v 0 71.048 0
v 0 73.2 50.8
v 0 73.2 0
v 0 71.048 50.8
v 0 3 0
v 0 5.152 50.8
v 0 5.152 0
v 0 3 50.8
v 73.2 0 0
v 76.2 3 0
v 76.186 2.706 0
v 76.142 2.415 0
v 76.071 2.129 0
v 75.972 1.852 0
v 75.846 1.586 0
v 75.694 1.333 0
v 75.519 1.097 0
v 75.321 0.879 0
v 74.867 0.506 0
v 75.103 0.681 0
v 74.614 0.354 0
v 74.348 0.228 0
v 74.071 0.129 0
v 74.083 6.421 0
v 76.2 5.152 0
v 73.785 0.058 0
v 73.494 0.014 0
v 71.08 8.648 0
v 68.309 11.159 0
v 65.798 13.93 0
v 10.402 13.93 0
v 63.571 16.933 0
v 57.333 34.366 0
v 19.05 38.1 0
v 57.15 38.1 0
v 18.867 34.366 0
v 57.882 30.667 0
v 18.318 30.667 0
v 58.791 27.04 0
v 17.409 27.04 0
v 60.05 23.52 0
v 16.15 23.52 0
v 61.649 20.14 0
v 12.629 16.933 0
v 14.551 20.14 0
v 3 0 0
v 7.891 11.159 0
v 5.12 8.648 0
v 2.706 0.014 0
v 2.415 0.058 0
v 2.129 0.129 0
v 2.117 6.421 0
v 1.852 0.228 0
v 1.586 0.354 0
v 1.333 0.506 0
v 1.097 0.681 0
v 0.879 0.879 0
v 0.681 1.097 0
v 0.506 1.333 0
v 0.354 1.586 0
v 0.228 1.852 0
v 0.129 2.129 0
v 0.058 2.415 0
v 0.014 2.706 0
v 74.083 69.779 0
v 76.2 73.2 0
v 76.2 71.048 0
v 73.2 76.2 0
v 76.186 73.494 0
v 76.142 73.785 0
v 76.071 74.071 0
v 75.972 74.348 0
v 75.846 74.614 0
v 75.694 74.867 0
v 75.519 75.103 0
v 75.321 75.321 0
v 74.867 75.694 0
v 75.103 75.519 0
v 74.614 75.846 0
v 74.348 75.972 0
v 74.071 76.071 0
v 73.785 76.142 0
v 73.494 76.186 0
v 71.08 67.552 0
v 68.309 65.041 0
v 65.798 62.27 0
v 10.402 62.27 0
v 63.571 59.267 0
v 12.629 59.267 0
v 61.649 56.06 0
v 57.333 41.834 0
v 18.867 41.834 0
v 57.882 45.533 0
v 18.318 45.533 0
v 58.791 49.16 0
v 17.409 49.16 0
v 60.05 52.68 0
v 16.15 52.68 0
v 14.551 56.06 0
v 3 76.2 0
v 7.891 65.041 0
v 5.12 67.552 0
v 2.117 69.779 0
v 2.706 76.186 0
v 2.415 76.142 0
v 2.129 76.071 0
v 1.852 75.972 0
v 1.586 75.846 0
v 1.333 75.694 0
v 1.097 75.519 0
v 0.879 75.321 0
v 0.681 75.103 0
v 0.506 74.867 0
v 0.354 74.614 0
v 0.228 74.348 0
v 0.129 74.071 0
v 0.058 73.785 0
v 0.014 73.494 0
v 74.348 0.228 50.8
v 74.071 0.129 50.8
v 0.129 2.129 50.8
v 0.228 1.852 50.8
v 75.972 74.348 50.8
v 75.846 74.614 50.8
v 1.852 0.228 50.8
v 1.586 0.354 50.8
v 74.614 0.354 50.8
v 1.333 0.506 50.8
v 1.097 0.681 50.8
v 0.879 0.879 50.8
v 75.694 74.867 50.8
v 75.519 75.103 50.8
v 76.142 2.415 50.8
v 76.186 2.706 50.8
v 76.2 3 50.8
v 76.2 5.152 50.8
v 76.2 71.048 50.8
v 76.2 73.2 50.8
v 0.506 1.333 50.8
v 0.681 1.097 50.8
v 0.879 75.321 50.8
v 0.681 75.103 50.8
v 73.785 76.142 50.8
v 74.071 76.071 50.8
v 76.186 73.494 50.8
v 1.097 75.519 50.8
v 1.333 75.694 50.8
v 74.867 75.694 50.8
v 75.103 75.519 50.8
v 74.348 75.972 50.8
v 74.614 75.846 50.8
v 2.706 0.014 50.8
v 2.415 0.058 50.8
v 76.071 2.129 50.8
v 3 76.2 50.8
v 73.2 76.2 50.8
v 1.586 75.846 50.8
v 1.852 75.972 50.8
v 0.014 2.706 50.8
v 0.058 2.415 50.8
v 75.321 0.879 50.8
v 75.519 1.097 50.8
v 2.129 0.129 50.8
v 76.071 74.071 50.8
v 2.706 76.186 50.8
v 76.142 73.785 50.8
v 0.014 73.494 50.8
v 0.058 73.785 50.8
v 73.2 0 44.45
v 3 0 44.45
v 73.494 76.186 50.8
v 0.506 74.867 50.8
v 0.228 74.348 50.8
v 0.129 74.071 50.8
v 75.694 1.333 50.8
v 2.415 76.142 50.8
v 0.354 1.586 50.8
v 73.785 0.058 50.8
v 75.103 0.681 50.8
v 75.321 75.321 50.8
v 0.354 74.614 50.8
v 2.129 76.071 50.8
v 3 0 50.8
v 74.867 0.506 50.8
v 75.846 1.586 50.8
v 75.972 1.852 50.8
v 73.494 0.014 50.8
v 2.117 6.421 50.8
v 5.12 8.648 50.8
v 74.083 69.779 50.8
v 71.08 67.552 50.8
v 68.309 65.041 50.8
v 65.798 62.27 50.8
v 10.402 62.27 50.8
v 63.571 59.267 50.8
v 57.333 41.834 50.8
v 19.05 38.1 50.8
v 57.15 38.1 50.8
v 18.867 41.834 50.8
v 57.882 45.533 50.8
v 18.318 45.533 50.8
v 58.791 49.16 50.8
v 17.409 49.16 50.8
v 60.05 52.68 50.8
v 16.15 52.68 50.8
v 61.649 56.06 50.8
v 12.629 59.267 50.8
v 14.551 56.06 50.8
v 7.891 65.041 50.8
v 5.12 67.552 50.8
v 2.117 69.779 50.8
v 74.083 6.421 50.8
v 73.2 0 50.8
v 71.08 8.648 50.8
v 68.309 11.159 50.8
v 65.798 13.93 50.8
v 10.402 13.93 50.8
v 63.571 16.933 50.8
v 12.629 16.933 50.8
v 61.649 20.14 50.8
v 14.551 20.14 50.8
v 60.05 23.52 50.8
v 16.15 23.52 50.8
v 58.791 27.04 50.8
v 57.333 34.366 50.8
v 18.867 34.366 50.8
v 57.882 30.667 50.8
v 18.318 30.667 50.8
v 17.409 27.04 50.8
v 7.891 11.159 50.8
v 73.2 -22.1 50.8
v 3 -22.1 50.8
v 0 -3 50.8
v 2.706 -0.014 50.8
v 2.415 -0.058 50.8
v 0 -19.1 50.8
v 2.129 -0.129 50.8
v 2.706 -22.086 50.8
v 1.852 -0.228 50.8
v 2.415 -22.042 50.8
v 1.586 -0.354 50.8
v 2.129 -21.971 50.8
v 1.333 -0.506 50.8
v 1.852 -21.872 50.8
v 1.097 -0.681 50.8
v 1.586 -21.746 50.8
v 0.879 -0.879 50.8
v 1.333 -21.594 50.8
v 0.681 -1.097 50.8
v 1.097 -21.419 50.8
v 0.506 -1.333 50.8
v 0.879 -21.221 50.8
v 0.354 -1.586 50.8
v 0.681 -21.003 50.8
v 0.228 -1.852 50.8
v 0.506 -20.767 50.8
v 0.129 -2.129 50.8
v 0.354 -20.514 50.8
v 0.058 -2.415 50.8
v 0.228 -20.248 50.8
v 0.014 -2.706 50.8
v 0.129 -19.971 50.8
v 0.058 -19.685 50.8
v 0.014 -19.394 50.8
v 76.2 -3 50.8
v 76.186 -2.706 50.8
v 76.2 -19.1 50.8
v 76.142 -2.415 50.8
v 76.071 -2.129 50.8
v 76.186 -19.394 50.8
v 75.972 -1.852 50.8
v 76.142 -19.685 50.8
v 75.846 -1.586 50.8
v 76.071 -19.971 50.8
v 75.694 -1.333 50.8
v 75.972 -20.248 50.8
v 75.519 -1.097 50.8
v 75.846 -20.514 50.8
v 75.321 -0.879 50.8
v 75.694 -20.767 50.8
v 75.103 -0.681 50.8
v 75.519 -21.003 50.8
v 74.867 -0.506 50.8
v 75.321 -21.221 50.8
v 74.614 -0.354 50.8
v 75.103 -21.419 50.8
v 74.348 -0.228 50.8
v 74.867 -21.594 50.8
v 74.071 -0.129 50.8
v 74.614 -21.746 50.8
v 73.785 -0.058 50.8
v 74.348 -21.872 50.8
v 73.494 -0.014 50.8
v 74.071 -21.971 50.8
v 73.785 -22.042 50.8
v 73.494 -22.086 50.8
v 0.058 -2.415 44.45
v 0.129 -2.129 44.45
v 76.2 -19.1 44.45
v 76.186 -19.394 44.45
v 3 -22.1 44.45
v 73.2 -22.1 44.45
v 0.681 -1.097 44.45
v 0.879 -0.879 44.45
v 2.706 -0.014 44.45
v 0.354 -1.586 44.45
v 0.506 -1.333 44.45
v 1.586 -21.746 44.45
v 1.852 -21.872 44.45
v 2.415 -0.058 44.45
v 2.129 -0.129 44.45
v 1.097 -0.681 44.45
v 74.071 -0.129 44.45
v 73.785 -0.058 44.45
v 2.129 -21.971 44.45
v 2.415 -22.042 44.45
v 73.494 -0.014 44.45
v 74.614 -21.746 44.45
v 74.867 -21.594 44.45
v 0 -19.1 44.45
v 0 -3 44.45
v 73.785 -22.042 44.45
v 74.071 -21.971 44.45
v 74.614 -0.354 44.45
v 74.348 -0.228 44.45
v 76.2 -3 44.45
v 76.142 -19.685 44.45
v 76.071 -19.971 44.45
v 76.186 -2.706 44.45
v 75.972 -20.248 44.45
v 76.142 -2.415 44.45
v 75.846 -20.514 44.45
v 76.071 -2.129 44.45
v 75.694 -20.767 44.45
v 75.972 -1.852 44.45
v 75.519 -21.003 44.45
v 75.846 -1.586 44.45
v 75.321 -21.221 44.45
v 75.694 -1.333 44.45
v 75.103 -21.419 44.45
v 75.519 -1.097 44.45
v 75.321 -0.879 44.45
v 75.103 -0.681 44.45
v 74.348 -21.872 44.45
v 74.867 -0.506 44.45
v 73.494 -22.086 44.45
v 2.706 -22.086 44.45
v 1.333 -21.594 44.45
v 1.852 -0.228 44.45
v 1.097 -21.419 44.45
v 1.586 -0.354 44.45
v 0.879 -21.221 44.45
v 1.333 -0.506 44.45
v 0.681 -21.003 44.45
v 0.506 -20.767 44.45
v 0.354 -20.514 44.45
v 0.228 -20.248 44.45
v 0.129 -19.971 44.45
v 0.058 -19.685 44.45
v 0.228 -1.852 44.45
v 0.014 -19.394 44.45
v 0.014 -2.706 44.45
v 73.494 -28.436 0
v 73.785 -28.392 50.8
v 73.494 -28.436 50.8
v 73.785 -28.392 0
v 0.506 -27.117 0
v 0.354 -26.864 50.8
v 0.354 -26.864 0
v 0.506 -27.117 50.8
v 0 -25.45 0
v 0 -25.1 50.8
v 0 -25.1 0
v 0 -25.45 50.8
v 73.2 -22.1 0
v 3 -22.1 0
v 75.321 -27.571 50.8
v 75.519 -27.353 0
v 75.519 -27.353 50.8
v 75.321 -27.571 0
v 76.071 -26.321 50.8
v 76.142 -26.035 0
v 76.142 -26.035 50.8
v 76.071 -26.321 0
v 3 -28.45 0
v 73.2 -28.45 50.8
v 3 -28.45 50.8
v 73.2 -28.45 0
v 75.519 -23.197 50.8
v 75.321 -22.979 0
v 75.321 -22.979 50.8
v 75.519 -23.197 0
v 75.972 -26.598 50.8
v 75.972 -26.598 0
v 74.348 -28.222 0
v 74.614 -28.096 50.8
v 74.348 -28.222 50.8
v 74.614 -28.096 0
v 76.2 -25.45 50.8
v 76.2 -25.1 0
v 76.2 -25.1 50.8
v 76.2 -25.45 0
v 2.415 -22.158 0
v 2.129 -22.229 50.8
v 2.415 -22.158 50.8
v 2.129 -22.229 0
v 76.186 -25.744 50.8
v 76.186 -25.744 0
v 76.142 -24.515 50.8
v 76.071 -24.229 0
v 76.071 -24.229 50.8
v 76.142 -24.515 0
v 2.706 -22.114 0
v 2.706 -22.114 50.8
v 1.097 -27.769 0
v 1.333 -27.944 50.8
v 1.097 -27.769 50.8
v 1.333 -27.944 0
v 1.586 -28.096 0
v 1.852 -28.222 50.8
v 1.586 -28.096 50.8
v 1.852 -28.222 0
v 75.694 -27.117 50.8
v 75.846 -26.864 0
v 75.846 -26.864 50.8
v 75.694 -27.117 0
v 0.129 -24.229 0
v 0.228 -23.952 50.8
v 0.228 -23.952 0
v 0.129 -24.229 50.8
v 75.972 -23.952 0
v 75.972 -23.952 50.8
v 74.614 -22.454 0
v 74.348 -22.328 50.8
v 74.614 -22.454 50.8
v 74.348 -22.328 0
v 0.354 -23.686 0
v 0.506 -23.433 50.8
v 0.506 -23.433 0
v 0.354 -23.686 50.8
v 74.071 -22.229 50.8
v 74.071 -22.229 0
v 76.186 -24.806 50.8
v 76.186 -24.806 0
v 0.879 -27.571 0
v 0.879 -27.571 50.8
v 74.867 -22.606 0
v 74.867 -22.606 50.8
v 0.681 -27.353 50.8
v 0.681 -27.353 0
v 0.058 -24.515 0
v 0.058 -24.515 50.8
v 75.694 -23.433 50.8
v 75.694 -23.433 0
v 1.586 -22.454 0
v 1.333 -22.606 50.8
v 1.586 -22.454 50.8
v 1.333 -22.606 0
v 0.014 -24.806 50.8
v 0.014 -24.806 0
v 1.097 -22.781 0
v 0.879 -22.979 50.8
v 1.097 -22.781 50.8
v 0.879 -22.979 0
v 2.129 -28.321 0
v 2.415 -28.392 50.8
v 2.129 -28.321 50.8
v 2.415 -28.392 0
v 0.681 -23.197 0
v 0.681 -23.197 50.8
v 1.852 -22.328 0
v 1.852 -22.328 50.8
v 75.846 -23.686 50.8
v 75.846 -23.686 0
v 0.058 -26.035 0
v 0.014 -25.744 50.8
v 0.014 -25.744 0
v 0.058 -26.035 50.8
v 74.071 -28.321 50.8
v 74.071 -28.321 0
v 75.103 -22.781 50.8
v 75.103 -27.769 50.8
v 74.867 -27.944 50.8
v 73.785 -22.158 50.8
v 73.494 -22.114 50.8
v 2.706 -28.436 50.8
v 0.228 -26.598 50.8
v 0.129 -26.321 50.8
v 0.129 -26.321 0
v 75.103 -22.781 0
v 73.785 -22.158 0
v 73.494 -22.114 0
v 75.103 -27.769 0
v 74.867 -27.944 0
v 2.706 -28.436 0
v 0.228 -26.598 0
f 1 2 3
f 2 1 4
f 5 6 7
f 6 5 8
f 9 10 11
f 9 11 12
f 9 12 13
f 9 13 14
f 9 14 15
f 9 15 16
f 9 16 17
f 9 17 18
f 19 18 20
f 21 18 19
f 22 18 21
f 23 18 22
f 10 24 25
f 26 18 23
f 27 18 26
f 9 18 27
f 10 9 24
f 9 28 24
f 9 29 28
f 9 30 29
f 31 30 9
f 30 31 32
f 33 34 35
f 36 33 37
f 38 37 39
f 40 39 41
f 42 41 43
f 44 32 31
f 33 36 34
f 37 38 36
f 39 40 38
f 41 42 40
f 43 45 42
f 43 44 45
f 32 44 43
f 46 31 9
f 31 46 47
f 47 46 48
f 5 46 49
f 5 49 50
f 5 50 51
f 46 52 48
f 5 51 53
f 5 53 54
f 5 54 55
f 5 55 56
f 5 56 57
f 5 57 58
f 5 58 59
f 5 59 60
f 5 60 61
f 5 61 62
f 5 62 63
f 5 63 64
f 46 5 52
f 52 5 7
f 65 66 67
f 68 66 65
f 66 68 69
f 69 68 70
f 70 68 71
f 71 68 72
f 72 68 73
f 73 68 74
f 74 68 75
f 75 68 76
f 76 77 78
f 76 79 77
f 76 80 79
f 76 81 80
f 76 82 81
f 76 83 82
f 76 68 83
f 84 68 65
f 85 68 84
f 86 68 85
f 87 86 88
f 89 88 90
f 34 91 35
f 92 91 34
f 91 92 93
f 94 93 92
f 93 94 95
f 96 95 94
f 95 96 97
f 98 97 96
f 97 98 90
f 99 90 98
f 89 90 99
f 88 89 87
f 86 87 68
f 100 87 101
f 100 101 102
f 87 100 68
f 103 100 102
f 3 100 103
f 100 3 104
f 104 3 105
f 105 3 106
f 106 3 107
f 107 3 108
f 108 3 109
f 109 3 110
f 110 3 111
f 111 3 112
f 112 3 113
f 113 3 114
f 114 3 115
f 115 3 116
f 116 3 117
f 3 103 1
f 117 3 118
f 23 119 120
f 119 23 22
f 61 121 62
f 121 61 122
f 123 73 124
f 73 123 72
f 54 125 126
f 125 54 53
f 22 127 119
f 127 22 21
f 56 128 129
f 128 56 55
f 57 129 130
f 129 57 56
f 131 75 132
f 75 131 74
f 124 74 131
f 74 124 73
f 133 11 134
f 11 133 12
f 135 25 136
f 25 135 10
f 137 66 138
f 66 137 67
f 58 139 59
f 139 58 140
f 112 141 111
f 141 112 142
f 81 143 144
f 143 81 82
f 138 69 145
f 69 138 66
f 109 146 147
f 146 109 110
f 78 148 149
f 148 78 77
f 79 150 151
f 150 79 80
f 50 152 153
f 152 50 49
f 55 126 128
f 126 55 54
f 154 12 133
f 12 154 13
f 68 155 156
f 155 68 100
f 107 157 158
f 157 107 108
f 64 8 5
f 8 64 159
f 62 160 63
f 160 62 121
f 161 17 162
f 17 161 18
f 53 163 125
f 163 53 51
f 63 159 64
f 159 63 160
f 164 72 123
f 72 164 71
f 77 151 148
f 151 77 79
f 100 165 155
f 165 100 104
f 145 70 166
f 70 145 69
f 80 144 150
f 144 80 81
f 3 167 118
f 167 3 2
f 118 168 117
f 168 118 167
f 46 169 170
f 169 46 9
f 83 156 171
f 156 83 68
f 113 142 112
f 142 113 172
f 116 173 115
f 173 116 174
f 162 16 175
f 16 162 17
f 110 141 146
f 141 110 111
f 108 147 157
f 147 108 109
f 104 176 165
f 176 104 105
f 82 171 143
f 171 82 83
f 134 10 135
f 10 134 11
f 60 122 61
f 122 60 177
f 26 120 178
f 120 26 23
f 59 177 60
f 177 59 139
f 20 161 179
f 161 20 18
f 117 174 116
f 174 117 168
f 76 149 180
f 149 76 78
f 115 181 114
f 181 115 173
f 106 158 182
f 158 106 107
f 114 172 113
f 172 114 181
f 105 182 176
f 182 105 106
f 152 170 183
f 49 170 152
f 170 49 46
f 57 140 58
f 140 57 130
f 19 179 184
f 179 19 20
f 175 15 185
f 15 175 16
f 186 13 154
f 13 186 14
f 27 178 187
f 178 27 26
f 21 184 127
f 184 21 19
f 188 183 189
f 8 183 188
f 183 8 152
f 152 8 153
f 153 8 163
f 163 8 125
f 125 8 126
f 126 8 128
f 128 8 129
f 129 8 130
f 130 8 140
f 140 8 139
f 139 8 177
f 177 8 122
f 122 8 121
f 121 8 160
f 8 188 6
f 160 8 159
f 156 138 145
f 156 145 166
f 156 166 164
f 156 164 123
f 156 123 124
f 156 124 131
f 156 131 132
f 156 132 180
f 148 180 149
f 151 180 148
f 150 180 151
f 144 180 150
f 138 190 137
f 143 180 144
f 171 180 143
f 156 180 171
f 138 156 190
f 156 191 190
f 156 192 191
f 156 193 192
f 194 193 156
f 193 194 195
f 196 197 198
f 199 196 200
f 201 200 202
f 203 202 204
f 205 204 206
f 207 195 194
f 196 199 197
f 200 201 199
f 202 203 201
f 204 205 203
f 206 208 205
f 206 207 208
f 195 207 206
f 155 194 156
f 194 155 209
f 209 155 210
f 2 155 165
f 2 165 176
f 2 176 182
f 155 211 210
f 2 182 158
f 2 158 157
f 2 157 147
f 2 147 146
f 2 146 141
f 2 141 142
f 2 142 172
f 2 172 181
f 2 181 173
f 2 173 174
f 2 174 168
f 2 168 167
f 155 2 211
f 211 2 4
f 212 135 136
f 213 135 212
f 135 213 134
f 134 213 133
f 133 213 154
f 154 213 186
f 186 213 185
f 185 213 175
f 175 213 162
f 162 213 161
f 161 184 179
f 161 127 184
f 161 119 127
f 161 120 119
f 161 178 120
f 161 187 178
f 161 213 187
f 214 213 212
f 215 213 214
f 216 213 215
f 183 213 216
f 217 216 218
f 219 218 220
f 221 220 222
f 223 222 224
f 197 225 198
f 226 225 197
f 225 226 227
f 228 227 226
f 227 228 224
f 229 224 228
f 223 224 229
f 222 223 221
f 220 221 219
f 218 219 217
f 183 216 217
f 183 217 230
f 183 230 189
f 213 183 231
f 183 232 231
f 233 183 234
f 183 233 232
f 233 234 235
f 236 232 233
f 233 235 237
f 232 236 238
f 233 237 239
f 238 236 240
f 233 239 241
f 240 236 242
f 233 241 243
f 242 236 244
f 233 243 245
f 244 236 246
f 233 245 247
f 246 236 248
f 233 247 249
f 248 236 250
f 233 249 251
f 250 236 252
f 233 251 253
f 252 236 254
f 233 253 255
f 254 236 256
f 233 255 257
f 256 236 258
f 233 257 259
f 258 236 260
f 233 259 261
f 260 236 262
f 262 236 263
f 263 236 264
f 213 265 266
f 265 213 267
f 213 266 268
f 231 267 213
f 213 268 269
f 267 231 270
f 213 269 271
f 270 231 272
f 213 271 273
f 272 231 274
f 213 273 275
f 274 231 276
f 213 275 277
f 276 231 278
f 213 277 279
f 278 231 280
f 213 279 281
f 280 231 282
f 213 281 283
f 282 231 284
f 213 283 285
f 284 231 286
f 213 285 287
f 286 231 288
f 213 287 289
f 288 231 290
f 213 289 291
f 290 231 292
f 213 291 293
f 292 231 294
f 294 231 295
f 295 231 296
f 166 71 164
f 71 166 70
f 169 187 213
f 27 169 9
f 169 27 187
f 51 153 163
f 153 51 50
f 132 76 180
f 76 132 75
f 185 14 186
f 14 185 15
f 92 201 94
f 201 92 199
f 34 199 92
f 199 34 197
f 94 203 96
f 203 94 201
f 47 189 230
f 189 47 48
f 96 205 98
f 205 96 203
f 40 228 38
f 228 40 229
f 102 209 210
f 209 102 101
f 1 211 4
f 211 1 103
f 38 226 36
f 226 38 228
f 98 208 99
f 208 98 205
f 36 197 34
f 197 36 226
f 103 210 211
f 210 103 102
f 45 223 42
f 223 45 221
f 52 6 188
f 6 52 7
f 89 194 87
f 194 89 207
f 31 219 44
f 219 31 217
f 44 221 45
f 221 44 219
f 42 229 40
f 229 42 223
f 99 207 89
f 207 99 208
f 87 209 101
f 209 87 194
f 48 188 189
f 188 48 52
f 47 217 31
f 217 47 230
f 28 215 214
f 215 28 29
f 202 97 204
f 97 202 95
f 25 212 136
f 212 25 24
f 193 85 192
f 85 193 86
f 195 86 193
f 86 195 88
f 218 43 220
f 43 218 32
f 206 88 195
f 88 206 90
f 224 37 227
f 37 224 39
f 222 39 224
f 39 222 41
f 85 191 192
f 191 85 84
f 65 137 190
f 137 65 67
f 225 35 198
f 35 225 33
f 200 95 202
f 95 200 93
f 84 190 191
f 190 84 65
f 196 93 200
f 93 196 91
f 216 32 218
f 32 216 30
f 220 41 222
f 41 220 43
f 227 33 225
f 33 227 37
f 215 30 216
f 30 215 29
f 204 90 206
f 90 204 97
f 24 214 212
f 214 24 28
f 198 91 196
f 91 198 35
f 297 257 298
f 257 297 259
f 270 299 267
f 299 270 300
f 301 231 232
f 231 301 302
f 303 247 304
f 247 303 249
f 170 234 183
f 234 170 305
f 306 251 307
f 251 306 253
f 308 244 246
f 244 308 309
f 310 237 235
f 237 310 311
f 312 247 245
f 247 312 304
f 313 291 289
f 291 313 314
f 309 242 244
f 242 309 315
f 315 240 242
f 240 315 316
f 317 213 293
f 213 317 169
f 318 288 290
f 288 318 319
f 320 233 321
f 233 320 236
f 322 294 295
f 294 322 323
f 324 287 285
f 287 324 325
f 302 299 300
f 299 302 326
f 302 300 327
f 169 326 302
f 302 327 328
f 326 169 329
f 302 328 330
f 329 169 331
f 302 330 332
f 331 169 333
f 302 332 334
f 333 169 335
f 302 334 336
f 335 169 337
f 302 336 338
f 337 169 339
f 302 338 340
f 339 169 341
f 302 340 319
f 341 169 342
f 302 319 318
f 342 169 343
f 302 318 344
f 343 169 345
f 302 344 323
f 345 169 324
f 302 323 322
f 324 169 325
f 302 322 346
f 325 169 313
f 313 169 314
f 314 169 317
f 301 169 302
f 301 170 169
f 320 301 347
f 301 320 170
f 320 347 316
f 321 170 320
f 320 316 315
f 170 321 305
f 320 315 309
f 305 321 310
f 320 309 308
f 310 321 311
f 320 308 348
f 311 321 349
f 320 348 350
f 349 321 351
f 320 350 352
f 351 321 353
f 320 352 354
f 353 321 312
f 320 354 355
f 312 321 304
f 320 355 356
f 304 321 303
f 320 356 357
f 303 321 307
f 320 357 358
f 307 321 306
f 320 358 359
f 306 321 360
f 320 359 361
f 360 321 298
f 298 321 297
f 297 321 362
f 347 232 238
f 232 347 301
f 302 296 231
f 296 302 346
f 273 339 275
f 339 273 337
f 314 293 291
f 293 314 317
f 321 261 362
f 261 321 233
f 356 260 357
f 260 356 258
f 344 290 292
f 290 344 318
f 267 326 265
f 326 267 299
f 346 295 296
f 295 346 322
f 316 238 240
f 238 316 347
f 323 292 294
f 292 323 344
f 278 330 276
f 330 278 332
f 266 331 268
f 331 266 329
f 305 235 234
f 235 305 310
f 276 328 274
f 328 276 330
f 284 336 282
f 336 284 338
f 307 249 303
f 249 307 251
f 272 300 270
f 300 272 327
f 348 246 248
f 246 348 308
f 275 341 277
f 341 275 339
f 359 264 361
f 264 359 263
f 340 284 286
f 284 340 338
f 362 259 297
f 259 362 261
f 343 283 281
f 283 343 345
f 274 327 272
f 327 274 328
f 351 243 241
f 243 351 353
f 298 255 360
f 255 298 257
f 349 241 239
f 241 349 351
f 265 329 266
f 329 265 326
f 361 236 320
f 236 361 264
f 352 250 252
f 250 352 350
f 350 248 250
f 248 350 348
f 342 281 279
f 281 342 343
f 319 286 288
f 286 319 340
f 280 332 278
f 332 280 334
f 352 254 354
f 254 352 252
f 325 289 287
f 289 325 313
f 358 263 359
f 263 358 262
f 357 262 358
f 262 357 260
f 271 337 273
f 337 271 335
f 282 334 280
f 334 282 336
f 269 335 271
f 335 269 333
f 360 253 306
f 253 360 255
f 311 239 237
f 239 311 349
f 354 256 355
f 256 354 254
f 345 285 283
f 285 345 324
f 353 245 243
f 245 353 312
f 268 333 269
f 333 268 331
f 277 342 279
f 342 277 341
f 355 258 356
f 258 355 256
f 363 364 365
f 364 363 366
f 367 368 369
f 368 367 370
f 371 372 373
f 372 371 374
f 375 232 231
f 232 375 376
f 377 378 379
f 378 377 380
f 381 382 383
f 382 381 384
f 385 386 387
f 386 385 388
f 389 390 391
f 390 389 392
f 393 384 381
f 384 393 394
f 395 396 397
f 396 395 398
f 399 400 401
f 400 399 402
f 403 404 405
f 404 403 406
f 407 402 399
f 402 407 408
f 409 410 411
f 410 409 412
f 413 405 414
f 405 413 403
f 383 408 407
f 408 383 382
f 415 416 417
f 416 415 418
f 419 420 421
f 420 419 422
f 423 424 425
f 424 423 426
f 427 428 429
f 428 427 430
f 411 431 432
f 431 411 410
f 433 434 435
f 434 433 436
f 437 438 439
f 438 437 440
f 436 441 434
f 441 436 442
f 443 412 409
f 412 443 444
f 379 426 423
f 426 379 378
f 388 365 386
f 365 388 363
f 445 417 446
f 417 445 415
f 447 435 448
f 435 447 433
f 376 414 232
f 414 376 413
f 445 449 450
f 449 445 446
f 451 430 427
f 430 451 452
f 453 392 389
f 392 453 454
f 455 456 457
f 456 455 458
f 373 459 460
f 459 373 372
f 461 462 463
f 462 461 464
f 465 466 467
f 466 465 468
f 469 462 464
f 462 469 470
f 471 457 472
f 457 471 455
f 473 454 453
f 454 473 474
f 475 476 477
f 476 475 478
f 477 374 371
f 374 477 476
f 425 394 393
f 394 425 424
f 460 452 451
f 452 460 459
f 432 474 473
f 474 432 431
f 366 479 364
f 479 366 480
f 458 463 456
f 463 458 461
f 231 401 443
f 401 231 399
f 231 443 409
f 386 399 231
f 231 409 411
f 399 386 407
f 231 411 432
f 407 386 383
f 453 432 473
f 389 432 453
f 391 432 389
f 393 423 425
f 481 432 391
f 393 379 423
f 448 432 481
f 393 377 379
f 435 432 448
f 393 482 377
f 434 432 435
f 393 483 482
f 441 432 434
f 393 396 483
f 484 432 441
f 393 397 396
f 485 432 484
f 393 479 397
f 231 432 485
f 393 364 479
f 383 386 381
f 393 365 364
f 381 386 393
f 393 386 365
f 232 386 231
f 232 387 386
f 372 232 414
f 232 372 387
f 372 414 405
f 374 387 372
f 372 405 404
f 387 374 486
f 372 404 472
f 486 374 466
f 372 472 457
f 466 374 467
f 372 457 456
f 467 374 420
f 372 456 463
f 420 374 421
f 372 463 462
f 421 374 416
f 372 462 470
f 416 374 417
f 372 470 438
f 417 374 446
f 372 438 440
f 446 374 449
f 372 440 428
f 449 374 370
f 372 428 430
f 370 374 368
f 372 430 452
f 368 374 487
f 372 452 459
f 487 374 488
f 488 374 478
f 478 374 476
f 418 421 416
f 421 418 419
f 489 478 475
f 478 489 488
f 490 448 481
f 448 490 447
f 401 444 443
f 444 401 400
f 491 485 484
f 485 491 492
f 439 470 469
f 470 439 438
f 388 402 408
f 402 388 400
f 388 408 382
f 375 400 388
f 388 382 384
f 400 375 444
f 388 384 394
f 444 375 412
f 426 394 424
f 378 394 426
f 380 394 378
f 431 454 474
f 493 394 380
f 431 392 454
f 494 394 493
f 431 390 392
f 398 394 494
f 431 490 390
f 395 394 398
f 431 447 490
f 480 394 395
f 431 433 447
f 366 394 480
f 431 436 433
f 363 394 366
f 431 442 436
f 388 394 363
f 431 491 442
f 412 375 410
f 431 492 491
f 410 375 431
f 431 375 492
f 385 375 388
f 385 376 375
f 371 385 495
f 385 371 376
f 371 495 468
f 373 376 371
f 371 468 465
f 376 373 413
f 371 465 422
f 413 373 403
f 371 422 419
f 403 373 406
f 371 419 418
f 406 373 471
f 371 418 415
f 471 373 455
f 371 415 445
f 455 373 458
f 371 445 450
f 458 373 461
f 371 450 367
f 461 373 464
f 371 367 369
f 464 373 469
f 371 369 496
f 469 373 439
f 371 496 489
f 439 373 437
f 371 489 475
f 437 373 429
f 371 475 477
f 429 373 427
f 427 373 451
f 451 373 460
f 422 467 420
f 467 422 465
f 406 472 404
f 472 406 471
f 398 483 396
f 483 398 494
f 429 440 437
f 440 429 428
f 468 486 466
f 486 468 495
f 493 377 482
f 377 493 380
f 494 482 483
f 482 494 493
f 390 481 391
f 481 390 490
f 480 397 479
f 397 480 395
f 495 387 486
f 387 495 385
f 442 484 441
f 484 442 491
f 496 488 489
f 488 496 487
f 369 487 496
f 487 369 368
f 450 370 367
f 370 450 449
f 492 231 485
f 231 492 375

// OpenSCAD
inch = 25.4;

spacer = [
    3 * inch,
    3 * inch,
    2 * inch,
];

clip_top = [
    spacer[0],
    22.1,
    .25 * inch,
];

clip_side = [
    spacer[0],
    clip_top[2],
    spacer[2],
];

cutout_h = 3 * inch;
cutout_r = 1.5 * inch;
roundness = 64;

r = 3;   // rounding radius
rh = 3;  // rounding height (keep equal to r for a quarter-circle profile)

// Rounds only the top and bottom horizontal edges of a box
// by doing minkowski with a short cylinder
module rounded_box_topbot(size, radius, round_h) {
    minkowski() {
        cube([size[0] - 2*radius, size[1] - 2*radius, size[2] - 2*round_h]);
        cylinder(r = radius, h = round_h * 2, $fn = roundness, center = true);
    }
}

// Main spacer body with cylinder cutouts
translate([r, r, rh])
difference() {
    rounded_box_topbot(spacer, r, rh);
    // Cutouts — extend well beyond top and bottom
    translate([-(cutout_r / 2) - r, cutout_r - r, -10])
        cylinder(h = cutout_h + 20, r = cutout_r, $fn = roundness);
    translate([(cutout_r * 2.5) - r, cutout_r - r, -10])
        cylinder(h = cutout_h + 20, r = cutout_r, $fn = roundness);
}

// Clip top
translate([r, -clip_top[1] + r, (spacer[2] - clip_top[2]) + rh])
    rounded_box_topbot(clip_top, r, rh);

// Clip side
translate([r, -(clip_top[1] + clip_side[1]) + r, (spacer[2] - clip_side[2]) + rh])
    rounded_box_topbot(clip_side, r, rh);
